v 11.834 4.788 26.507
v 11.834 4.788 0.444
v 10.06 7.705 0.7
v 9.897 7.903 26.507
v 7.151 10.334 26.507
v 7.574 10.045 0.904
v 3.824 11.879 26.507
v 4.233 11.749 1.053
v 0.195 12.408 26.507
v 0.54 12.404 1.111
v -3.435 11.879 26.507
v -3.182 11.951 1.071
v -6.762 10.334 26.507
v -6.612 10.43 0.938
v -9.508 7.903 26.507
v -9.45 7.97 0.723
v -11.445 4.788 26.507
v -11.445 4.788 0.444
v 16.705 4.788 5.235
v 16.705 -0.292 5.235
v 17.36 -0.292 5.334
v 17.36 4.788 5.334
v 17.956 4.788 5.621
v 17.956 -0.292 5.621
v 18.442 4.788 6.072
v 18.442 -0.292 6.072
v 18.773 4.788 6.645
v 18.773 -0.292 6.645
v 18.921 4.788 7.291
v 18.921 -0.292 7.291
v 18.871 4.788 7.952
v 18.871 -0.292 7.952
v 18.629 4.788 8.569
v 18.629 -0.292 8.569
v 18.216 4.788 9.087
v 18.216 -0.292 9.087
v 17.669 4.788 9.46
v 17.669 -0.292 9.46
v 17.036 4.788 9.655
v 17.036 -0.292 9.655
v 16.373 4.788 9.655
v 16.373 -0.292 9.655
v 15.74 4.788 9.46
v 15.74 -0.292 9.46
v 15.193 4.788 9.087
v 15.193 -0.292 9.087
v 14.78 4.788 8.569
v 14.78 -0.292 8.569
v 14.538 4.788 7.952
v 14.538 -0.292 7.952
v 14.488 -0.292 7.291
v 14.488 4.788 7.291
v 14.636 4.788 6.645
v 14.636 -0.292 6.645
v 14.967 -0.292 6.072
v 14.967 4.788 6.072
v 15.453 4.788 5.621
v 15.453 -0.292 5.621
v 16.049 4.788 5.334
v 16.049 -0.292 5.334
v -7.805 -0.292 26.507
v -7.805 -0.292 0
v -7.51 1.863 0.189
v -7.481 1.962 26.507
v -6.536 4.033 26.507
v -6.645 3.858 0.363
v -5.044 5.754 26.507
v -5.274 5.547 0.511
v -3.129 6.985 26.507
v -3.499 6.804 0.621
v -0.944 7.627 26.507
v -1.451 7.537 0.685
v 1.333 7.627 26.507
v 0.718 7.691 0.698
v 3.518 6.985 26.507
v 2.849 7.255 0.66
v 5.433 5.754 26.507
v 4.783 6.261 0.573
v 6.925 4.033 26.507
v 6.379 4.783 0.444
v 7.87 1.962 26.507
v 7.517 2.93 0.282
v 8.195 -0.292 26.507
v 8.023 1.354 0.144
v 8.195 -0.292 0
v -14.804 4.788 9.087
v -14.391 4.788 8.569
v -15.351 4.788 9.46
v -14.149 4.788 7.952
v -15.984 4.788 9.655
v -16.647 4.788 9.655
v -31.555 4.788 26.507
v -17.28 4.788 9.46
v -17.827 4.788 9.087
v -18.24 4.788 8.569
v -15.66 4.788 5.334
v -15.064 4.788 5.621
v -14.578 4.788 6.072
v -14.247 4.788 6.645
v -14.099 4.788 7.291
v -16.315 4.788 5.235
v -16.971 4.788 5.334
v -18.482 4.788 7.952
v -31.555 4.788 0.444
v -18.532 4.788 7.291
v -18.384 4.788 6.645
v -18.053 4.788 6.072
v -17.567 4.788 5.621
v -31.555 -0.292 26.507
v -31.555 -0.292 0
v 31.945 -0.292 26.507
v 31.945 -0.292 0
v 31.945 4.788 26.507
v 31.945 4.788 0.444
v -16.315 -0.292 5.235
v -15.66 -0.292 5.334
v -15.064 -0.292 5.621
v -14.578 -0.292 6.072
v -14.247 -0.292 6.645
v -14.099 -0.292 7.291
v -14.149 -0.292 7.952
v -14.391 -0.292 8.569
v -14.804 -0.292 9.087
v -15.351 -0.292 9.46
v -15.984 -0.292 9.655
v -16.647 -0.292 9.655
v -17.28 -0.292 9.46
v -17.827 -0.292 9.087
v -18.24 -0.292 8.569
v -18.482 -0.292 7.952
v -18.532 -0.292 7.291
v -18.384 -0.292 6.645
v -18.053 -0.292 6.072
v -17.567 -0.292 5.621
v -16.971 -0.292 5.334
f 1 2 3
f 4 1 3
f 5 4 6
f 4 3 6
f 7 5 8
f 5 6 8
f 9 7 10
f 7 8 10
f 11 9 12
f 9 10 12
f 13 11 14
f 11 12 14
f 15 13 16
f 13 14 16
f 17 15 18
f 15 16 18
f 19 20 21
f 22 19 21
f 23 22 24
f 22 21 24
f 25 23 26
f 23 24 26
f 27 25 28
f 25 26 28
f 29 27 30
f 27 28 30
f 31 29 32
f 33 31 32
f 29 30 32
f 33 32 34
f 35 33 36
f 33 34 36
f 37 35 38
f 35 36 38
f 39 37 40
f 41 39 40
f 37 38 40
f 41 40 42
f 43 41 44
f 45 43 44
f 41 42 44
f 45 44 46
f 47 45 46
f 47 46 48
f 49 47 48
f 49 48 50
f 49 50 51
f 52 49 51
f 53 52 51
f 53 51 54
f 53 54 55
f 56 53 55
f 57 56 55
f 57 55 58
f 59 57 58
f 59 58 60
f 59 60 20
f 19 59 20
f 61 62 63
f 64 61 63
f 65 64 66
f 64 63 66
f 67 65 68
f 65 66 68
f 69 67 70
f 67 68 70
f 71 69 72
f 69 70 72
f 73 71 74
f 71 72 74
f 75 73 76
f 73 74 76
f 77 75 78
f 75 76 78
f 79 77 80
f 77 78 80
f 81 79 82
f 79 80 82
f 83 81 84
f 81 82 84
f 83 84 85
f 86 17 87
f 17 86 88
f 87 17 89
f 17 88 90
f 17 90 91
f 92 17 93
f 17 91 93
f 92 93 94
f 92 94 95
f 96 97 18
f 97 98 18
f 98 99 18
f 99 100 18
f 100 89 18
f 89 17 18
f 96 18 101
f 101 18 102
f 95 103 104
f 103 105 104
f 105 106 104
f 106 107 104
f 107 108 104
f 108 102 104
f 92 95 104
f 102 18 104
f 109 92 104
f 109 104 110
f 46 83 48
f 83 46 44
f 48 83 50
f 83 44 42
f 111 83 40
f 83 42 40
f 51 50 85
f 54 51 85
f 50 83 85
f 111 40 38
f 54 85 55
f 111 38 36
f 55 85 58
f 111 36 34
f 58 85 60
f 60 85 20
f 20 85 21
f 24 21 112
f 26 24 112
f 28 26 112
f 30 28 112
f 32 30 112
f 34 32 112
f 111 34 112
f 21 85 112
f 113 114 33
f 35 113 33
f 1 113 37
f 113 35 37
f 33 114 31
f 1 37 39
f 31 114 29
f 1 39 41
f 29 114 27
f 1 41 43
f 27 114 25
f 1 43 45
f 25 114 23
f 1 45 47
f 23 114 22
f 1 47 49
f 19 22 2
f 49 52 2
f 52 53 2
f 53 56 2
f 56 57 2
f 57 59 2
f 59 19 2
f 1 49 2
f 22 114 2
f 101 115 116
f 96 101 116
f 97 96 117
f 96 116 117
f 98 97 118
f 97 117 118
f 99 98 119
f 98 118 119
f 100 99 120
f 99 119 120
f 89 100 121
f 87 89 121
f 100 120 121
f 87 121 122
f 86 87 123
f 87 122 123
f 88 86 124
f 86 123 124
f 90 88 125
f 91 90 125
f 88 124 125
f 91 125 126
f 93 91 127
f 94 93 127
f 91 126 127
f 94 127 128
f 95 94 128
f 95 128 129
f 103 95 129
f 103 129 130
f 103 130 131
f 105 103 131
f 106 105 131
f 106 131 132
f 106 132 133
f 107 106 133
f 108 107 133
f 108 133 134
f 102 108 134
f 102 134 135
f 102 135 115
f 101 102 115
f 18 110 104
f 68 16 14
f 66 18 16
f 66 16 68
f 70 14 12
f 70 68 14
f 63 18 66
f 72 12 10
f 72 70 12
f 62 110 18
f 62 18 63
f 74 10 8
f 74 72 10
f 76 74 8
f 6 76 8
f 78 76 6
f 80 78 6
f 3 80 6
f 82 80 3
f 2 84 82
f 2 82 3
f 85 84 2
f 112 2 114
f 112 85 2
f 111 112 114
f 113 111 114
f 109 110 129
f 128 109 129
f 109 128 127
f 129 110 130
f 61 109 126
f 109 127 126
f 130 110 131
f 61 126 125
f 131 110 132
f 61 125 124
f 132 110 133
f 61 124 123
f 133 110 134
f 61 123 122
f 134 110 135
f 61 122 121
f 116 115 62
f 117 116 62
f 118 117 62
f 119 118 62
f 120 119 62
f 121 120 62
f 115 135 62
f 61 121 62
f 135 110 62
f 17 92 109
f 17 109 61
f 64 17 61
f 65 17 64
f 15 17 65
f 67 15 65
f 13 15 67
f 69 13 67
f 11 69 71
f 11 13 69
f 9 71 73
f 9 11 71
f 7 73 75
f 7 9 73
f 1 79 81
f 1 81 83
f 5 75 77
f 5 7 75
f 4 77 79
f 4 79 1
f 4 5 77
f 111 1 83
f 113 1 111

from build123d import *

# Parameters (mm, degrees)
BOSS_EXTRUDE2_DEPTH    = 26.50744
CUT_EXTRUDE1_START     = -0.02543021
CUT_EXTRUDE1_OUTLINE_W = 66
CUT_EXTRUDE1_OUTLINE_H = 16
CUT_EXTRUDE1_DEPTH     = 1.106877933
CUT_EXTRUDE2_REACH     = 45.41
SKETCH4_R              = 2.2225


# Read off the part's stored shape, not the designer's step: Cut-Extrude1
with BuildPart() as part:
    # Sketch2 → Boss-Extrude2 (new body)
    with BuildSketch(Plane.XY):
        with BuildLine():
            ThreePointArc((-11.445222977, 4.788221067), (-12.237590886, 2.302953542), (-12.505480711, -0.291778933))
            Line((-12.505480711, -0.291778933), (-7.805480711, -0.291778933))
            ThreePointArc((-7.805480711, -0.291778933), (0.194519289, 7.708221067), (8.194519289, -0.291778933))
            Line((8.194519289, -0.291778933), (12.894519289, -0.291778933))
            ThreePointArc((12.894519289, -0.291778933), (12.626629463, 2.302953542), (11.834261554, 4.788221067))
            ThreePointArc((11.834261554, 4.788221067), (0.194519289, 12.408221067), (-11.445222977, 4.788221067))
        make_face()
        with BuildLine():
            Line((-31.555480711, -0.291778933), (-12.505480711, -0.291778933))
            ThreePointArc((-12.505480711, -0.291778933), (-12.237590886, 2.302953542), (-11.445222977, 4.788221067))
            Line((-11.445222977, 4.788221067), (-31.555480711, 4.788221067))
            Line((-31.555480711, 4.788221067), (-31.555480711, -0.291778933))
        make_face()
        with BuildLine():
            ThreePointArc((11.834261554, 4.788221067), (12.626629463, 2.302953542), (12.894519289, -0.291778933))
            Line((12.894519289, -0.291778933), (31.944519289, -0.291778933))
            Line((31.944519289, -0.291778933), (31.944519289, 4.788221067))
            Line((31.944519289, 4.788221067), (11.834261554, 4.788221067))
        make_face()
    extrude(amount=BOSS_EXTRUDE2_DEPTH)

    # Cut-Extrude1 outline → Cut-Extrude1 (cut)
    with BuildSketch(Plane(origin=(0, 0, 0), x_dir=(1, 0, 0), z_dir=(0, 0.08715574274765836, -0.9961946980917455)).offset(CUT_EXTRUDE1_START)):
        with Locations((0, -6)):
            Rectangle(CUT_EXTRUDE1_OUTLINE_W, CUT_EXTRUDE1_OUTLINE_H)
    extrude(amount=CUT_EXTRUDE1_DEPTH, mode=Mode.SUBTRACT)

    # Sketch4 → Cut-Extrude2 (cut, up to next)
    with BuildSketch(Plane.XZ.offset(0.291778933), mode=Mode.PRIVATE) as cut_extrude2_sk1:
        with Locations(Location((-16.315480711, 7.45744, 0), (0, 0, 270))):
            Circle(SKETCH4_R)
    cut_extrude2_tool1 = extrude(cut_extrude2_sk1.sketch, amount=-CUT_EXTRUDE2_REACH, mode=Mode.PRIVATE) & part.part
    # Sketch4 → Cut-Extrude2 (cut, up to next)
    with BuildSketch(Plane.XZ.offset(0.291778933), mode=Mode.PRIVATE) as cut_extrude2_sk2:
        with Locations(Location((16.704519289, 7.45744, 0), (0, 0, 270))):
            Circle(SKETCH4_R)
    cut_extrude2_tool2 = extrude(cut_extrude2_sk2.sketch, amount=-CUT_EXTRUDE2_REACH, mode=Mode.PRIVATE) & part.part
    add(cut_extrude2_tool1.solids().sort_by_distance((-16.315481, -0.291779, 7.45744))[0], mode=Mode.SUBTRACT)
    add(cut_extrude2_tool2.solids().sort_by_distance((16.704519, -0.291779, 7.45744))[0], mode=Mode.SUBTRACT)


solid = part.part
